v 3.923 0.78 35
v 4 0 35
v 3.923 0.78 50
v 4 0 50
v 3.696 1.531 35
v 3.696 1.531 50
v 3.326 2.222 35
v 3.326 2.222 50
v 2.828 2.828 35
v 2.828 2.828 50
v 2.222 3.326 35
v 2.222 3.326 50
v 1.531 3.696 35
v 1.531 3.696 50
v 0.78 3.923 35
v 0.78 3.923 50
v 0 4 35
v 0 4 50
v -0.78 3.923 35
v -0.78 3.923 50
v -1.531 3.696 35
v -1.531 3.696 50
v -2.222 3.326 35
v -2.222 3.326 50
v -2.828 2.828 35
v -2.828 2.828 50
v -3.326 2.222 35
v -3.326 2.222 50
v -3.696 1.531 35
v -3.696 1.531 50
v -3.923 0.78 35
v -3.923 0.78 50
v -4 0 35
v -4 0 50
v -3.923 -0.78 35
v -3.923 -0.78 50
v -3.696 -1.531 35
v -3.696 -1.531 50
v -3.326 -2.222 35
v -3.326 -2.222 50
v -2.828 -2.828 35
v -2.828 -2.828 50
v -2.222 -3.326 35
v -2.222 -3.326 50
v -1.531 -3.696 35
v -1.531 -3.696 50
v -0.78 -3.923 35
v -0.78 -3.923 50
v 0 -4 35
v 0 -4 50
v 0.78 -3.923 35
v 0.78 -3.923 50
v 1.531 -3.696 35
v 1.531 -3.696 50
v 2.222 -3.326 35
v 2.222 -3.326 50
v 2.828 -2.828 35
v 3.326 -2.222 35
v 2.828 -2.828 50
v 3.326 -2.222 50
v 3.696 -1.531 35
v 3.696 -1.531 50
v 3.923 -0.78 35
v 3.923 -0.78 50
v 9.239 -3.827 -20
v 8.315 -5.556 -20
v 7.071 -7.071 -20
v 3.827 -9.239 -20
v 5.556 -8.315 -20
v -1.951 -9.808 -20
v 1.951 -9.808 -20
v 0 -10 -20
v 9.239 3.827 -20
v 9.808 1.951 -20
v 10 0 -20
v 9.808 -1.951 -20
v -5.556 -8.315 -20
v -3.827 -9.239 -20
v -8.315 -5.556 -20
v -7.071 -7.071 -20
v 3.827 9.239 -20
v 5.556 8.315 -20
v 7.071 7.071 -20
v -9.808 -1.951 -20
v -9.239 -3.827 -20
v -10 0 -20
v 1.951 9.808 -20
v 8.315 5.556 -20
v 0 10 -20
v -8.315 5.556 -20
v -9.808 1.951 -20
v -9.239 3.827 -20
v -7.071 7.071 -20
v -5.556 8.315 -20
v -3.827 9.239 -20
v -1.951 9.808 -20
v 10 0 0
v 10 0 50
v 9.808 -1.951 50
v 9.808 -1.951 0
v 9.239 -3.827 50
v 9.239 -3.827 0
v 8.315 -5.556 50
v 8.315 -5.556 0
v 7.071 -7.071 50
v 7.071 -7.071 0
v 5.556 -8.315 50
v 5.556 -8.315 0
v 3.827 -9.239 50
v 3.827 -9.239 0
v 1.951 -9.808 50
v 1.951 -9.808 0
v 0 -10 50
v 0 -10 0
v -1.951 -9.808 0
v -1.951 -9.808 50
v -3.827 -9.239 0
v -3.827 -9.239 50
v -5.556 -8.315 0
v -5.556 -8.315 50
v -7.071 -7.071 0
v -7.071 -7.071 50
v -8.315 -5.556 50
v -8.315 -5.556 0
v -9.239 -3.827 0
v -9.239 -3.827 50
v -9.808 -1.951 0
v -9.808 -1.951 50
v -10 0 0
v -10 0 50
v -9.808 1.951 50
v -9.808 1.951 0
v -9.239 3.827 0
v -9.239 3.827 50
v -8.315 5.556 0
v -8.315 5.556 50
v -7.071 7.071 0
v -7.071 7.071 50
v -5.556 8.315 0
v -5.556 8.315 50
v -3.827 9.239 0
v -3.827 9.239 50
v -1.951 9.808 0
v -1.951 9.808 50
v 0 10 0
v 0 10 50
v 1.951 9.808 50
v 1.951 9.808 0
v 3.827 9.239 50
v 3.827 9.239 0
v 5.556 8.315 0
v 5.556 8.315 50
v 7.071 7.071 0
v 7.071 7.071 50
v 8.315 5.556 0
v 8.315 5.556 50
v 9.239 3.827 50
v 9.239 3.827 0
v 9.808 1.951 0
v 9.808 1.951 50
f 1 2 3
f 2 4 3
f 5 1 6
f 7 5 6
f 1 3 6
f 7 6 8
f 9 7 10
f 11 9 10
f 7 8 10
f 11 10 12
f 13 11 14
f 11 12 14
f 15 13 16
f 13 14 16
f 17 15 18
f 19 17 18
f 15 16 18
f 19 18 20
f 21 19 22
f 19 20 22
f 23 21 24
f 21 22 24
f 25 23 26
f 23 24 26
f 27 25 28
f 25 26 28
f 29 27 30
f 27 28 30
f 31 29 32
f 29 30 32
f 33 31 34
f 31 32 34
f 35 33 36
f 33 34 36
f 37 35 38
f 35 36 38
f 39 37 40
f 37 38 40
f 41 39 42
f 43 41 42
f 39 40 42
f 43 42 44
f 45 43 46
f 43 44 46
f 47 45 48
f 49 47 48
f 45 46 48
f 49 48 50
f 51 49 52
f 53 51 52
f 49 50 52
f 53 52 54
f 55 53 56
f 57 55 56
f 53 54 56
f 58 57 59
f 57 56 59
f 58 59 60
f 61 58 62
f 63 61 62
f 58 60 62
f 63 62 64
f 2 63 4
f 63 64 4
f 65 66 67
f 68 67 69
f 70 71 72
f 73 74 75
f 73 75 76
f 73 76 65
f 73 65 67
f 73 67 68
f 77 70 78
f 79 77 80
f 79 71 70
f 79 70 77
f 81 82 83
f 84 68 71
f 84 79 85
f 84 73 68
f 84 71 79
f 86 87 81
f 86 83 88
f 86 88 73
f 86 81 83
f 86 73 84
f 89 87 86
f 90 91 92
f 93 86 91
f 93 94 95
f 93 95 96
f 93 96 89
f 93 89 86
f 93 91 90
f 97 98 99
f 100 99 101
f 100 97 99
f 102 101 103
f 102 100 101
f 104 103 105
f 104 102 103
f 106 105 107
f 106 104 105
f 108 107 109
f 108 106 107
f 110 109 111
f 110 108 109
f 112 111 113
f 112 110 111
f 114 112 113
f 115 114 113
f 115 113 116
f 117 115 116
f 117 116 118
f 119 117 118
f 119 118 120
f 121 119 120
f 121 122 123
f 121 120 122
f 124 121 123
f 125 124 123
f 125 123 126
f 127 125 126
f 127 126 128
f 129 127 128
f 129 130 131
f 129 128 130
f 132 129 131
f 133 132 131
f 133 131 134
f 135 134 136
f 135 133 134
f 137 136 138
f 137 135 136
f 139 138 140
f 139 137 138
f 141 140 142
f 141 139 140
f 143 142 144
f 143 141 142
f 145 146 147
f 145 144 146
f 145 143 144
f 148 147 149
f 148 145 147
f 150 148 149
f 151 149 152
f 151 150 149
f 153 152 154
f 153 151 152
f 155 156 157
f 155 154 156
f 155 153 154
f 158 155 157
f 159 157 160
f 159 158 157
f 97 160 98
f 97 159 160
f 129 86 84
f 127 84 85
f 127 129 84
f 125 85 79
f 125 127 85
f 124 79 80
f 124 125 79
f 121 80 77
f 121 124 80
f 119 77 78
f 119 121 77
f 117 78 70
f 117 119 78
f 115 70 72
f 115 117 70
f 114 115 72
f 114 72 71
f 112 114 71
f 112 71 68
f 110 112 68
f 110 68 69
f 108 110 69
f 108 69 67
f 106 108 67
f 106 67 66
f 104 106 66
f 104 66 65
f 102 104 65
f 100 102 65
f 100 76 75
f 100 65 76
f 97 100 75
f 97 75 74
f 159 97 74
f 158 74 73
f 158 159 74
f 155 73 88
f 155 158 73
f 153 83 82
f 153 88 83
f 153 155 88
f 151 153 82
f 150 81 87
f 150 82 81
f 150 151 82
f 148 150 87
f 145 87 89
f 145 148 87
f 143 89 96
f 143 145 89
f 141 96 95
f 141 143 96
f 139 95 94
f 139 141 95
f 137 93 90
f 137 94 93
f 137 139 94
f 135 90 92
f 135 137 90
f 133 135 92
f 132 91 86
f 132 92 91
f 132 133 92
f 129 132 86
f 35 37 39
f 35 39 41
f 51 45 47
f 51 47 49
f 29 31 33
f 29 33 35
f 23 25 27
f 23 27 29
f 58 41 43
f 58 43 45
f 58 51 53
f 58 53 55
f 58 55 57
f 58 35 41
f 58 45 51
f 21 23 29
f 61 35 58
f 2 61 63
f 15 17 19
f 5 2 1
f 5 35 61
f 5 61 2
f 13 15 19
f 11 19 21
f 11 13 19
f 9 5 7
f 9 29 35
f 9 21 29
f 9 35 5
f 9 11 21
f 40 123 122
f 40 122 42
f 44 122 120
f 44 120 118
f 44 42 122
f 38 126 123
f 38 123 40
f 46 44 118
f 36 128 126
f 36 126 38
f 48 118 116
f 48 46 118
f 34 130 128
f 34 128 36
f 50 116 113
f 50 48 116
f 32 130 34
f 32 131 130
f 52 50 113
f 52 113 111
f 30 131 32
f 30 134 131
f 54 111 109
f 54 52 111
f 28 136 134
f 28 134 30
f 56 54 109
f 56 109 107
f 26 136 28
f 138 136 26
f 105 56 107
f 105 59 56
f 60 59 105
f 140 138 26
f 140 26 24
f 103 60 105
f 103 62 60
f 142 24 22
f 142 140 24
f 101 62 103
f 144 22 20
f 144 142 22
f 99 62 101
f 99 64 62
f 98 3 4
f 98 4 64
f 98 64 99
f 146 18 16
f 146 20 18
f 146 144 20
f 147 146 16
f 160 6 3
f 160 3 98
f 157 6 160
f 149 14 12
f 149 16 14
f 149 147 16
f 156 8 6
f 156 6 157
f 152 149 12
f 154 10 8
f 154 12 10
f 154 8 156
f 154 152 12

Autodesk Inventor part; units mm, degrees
ref_plane "YZ Plane" through (0, 0, 0) normal (1, 0, 0) x (0, 1, 0)
ref_plane "XZ Plane" through (0, 0, 0) normal (0, 1, 0) x (-1, 0, 0)
ref_plane "XY Plane" through (0, 0, 0) normal (0, 0, 1) x (1, 0, 0)
sketch "Sketch1" plane through (0, 0, 0) normal (0, 0, 1) x (1, 0, 0)
  circle A0 centre (0, 0) radius 10
  dimension "d0" = 20
extrude "Extrusion1" add sketch "Sketch1" along normal blind 50
sketch "Sketch2" plane through (0, 0, 50) normal (0, 0, 1) x (1, 0, 0)
  circle A0 centre (0, 0) radius 4
  dimension "d3" = 8
extrude "Extrusion2" cut sketch "Sketch2" against normal blind 15
sketch "Sketch3" plane through (0, 0, 0) normal (0, 0, -1) x (-1, 0, 0)
  point P0 (0, 0)
sketch "Sketch4" plane through (0, 0, 0) normal (0, 0, -1) x (-1, 0, 0)
  circle A0 centre (0, 0) radius 10
extrude "Extrusion3" add sketch "Sketch4" along normal blind 20
properties part number "rollers"
